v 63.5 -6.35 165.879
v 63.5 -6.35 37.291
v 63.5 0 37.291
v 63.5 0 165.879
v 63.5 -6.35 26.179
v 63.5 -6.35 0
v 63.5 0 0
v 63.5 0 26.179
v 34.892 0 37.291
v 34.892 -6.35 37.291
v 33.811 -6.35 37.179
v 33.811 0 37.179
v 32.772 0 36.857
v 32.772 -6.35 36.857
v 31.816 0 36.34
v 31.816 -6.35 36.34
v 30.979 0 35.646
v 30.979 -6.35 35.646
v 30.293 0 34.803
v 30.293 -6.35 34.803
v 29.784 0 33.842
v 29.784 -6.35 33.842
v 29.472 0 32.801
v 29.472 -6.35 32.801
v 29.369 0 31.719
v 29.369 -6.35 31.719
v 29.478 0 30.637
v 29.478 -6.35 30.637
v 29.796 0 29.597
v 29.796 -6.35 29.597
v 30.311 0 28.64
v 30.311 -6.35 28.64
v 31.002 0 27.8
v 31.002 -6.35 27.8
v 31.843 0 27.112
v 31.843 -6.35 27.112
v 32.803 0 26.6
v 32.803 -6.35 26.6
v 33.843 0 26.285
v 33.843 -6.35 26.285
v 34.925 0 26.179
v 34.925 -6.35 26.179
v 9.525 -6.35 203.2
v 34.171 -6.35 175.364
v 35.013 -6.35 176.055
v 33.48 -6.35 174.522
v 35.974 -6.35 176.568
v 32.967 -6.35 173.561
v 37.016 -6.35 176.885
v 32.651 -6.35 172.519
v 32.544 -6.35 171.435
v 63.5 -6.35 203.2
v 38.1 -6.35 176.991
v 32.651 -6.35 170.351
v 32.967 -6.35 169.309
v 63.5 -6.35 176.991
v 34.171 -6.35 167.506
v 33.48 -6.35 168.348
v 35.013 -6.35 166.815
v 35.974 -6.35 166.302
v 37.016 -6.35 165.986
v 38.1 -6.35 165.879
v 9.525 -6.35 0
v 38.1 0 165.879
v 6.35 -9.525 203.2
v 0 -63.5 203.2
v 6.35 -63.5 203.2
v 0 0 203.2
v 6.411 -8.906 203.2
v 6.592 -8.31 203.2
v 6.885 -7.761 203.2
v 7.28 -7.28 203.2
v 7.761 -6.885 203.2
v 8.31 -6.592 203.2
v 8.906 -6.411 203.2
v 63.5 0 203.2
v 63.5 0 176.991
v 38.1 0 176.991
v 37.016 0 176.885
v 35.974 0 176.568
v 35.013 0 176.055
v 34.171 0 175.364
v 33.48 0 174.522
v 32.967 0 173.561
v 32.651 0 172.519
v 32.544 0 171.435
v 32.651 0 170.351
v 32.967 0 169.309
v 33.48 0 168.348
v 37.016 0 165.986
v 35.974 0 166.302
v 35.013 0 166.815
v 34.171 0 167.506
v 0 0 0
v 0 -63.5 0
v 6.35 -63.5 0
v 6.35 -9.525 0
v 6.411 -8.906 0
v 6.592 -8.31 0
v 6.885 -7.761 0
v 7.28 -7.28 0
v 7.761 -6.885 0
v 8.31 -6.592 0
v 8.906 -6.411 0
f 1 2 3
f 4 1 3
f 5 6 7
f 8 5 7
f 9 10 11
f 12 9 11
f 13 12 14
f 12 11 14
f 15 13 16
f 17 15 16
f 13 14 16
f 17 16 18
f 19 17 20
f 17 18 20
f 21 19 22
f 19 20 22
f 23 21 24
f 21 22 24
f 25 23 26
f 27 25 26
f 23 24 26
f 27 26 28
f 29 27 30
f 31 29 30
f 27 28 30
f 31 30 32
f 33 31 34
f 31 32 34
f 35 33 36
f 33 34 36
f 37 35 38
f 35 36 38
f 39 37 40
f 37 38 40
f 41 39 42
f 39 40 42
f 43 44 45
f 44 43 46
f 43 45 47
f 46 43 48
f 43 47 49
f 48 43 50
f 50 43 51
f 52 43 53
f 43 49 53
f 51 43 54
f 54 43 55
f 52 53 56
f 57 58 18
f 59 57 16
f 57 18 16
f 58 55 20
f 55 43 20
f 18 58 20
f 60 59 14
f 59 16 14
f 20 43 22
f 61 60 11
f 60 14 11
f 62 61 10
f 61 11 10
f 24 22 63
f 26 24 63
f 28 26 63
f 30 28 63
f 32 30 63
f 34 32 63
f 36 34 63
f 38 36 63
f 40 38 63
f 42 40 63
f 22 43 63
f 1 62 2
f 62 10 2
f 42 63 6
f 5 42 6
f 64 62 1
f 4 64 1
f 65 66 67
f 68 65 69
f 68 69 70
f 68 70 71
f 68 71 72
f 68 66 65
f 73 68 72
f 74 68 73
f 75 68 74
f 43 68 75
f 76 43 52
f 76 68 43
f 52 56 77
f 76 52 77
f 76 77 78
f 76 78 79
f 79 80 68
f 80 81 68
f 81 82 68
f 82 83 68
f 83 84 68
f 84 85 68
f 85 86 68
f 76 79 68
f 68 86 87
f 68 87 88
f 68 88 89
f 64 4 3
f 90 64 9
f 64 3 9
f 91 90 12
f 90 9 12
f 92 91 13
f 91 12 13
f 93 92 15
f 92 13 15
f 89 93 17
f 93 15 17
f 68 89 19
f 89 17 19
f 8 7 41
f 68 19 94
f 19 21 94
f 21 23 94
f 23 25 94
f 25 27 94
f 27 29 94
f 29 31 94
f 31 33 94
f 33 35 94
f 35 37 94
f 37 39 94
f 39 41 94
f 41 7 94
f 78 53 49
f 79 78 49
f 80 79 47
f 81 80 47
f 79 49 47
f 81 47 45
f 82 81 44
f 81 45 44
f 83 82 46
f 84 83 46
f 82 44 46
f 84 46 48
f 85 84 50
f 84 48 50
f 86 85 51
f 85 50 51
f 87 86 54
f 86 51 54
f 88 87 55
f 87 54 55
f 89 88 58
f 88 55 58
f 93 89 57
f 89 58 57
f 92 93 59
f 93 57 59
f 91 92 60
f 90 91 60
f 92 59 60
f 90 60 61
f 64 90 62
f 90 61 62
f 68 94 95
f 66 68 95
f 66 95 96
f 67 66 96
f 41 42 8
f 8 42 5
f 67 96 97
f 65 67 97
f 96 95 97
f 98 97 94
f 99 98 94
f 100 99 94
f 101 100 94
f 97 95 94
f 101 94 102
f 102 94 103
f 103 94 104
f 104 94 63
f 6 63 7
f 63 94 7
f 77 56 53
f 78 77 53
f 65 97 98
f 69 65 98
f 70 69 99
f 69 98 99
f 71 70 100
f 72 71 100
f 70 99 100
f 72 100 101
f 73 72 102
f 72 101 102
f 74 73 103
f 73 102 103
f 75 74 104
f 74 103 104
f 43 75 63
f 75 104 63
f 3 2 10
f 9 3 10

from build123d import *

# Parameters (mm, degrees)
F1_DEPTH = 203.2
F3_DEPTH = 25.4


# Not quite as in the source:
# - ends of sketch curves that miss each other by under 0.0002 mm in the source are joined


with BuildPart() as f1:
    # F0 (on Top) → F1 (new body)
    with BuildSketch(Plane.XY):
        with BuildLine():
            Line((0, -6.35), (0, -63.5))
            Line((0, -63.5), (6.35, -63.5))
            Line((6.35, -63.5), (6.35, -9.525))
            ThreePointArc((6.35, -9.525), (7.2799359697, -7.2799359697), (9.525, -6.35))
            Line((9.525, -6.35), (63.5, -6.35))
            Line((63.5, -6.35), (63.5, 0))
            Line((63.5, 0), (6.35, 0))
            Line((6.35, 0), (0, 0))
            Line((0, 0), (0, -6.35))
        make_face()
    extrude(amount=F1_DEPTH)

    # F2 (on face) → F3 (cut)
    with BuildSketch(Plane.XZ.offset(6.35)):
        with BuildLine():
            Line((38.1, 165.8788350046), (63.5, 165.8788350046))
            Line((63.5, 165.8788350046), (63.5, 176.9913350046))
            Line((63.5, 176.9913350046), (38.1, 176.9913350046))
            ThreePointArc((38.1, 176.9913350046), (32.54375, 171.4350850046), (38.1, 165.8788350046))
        make_face()
        with BuildLine():
            Line((34.925, 37.2913350046), (34.8918574917, 37.2913350046))
            ThreePointArc((34.8918574917, 37.2913350046), (29.3687747109, 31.7185139715), (34.925, 26.1788350046))
            Line((34.925, 26.1788350046), (63.5, 26.1788350046))
            Line((63.5, 26.1788350046), (63.5, 37.2913350046))
            Line((63.5, 37.2913350046), (34.925, 37.2913350046))
        make_face()
    extrude(amount=-F3_DEPTH, mode=Mode.SUBTRACT)


solid = f1.part
